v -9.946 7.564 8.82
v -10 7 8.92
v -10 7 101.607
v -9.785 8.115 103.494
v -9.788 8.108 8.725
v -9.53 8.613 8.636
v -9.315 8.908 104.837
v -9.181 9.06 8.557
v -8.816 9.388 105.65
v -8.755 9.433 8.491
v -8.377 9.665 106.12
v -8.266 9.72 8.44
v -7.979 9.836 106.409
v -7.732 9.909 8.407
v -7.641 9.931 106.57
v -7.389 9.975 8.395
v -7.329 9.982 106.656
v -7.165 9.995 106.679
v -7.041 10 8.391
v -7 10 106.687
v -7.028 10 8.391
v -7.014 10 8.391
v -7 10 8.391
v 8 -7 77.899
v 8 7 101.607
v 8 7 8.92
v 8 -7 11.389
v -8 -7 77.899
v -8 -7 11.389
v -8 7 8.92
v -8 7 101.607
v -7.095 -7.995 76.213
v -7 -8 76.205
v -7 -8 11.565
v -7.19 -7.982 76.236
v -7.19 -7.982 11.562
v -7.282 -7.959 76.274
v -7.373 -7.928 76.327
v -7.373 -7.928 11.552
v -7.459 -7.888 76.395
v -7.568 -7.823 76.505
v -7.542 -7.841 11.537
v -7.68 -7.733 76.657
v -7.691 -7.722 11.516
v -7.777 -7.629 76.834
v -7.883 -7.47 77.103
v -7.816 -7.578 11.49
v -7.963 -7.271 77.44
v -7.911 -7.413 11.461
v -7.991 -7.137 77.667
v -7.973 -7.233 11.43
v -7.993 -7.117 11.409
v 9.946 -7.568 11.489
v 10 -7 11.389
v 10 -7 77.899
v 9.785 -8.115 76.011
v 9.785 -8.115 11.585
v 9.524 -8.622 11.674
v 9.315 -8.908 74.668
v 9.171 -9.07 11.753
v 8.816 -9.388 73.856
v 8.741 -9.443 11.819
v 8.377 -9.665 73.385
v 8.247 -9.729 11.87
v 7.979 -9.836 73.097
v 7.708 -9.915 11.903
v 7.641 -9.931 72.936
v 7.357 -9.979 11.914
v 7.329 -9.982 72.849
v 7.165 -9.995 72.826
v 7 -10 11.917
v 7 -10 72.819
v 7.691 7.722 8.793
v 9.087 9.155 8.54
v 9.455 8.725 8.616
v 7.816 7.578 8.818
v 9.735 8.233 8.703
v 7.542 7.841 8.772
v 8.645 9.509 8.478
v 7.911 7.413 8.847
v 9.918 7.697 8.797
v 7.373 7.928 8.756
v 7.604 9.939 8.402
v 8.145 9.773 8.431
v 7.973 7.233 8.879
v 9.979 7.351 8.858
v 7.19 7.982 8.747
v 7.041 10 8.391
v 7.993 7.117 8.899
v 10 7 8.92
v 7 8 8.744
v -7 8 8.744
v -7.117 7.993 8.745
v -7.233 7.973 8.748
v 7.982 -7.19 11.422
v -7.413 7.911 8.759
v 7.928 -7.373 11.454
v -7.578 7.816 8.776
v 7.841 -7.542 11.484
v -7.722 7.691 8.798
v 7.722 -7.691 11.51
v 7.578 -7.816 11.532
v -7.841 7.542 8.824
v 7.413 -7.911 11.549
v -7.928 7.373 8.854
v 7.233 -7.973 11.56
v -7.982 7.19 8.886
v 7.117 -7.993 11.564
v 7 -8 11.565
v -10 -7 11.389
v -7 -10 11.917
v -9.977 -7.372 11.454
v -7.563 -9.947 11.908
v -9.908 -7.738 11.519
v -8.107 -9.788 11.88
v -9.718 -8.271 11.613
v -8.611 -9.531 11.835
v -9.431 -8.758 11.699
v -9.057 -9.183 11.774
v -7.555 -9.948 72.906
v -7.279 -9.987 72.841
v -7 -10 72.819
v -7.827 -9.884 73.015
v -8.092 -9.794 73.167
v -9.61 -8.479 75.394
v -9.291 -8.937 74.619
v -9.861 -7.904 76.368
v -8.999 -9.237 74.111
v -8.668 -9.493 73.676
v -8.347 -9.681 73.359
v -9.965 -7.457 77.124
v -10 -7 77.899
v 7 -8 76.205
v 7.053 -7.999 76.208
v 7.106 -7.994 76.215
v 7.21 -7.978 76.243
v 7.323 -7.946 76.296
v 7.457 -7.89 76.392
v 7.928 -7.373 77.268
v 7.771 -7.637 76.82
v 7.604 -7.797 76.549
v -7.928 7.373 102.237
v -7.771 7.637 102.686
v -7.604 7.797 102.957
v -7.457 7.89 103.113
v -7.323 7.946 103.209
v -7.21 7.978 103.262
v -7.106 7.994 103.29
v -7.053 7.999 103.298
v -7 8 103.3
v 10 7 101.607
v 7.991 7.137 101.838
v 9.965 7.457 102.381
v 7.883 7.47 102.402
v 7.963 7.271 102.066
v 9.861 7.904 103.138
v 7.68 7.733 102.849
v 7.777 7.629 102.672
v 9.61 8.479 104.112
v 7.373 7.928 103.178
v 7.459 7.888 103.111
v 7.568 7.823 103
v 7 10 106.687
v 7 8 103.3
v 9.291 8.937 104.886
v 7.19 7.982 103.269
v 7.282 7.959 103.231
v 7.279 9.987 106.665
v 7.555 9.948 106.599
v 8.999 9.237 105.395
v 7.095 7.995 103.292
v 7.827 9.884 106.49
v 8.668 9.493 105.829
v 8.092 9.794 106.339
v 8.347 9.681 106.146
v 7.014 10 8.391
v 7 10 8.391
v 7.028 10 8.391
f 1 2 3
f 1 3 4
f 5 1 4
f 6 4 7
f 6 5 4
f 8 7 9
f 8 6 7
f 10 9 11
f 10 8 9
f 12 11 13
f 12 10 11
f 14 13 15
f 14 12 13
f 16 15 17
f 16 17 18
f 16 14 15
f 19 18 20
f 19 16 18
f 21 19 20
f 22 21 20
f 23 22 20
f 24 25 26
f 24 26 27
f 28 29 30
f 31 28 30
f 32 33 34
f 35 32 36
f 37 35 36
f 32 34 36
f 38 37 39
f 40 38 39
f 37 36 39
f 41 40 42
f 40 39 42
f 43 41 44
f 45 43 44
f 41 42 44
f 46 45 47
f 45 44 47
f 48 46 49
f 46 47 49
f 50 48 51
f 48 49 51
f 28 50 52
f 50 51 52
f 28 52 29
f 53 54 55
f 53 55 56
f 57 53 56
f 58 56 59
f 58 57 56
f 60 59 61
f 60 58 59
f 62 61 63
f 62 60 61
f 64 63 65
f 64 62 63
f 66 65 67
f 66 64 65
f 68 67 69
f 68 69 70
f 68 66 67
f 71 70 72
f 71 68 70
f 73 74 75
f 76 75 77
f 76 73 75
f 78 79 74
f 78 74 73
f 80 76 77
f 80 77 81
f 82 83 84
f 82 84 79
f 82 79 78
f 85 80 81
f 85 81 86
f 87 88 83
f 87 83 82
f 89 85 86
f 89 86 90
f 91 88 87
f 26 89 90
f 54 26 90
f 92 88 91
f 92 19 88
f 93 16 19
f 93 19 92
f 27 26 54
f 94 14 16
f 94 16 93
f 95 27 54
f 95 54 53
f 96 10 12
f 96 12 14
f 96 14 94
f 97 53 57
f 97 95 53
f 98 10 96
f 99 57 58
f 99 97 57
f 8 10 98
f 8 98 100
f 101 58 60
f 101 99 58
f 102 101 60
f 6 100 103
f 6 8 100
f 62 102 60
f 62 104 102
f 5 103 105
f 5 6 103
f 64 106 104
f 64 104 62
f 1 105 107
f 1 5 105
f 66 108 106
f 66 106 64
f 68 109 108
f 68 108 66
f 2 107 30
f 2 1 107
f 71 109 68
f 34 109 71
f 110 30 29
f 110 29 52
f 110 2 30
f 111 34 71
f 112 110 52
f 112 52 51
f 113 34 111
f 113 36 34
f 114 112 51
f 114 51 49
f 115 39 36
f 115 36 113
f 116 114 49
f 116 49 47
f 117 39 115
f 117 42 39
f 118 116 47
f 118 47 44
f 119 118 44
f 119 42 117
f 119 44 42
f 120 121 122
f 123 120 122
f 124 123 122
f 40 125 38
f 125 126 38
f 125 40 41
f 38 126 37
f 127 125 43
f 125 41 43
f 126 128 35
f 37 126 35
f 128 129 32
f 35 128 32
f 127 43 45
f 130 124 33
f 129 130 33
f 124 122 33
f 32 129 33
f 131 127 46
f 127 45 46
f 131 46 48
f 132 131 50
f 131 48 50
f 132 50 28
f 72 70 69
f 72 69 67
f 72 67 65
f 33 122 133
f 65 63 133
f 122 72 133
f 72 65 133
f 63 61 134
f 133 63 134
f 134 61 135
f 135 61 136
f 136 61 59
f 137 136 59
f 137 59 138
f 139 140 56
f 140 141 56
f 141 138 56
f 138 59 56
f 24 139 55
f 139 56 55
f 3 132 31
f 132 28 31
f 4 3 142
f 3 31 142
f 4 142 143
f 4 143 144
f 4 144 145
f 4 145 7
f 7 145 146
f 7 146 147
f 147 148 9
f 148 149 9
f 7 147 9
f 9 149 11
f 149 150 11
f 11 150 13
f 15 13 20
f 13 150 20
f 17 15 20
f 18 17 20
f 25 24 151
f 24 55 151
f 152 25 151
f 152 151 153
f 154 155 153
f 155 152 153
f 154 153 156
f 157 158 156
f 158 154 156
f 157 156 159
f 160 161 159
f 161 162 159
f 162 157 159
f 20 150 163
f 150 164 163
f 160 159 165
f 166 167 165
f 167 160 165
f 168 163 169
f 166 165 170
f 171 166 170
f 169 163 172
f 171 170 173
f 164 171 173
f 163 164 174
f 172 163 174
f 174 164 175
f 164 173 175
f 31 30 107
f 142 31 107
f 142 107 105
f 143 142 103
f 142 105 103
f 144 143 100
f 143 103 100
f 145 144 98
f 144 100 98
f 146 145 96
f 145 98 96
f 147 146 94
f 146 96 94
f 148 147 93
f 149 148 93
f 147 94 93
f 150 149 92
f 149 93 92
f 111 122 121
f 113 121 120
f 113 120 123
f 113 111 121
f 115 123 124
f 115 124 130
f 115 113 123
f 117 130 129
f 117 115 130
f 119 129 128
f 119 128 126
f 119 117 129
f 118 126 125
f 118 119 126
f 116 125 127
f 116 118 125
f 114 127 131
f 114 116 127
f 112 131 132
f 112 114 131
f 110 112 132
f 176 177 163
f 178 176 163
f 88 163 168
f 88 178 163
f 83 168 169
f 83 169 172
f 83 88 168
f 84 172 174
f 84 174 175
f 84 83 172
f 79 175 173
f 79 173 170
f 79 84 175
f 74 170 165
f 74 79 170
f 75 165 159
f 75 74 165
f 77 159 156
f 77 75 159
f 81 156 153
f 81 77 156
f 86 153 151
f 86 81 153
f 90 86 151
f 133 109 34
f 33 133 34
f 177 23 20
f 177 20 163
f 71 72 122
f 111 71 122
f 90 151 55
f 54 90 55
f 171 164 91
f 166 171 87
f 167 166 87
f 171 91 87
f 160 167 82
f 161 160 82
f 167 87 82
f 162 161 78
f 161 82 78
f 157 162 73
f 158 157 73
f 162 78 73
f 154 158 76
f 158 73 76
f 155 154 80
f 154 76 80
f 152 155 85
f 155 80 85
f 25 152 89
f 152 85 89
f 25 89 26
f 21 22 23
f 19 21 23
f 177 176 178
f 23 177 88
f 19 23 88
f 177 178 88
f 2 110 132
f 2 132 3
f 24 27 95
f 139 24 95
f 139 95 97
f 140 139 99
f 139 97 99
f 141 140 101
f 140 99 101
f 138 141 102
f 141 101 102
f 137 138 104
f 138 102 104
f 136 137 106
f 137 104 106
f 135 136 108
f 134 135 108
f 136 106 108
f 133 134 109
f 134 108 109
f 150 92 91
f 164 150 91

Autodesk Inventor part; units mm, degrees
ref_plane "Start Plane" through (0, 0, 8.391) normal (0, 0, 1) x (1, 0, 0)
ref_plane "End Plane" through (0, 0, 60) normal (0, 0, 1) x (1, 0, 0)
sketch "Sketch" plane through (0, 0, 0) normal (0, 0, 1) x (1, 0, 0)
  line L0 (-10, -7) -> (-10, 7)
  line L1 (-7, 10) -> (7, 10)
  line L2 (10, 7) -> (10, -7)
  line L3 (7, -10) -> (-7, -10)
  arc A0 (-10, -7) -> (-7, -10) centre (-7, -7) ccw
  arc A1 (-7, 10) -> (-10, 7) centre (-7, 7) ccw
  arc A2 (10, 7) -> (7, 10) centre (7, 7) ccw
  arc A3 (7, -10) -> (10, -7) centre (7, -7) ccw
  arc A4 (-7, 8) -> (-8, 7) centre (-7, 7) ccw
  line L4 (-7, 8) -> (7, 8)
  arc A5 (8, 7) -> (7, 8) centre (7, 7) ccw
  line L5 (8, 7) -> (8, -7)
  arc A6 (7, -8) -> (8, -7) centre (7, -7) ccw
  line L6 (7, -8) -> (-7, -8)
  arc A7 (-8, -7) -> (-7, -8) centre (-7, -7) ccw
  line L7 (-8, -7) -> (-8, 7)
  line L8 (0, 14.8698) -> (0, -14.8698) construction
  line L9 (-14.8698, 0) -> (14.8698, 0) construction
  dimension "d7" = 3
  dimension "d10" = 20
  dimension "d11" = 20
  dimension "d12" = 2
  dimension "d15" = 10
  dimension "d16" = 10
extrude "Body" add sketch "Sketch" along normal up to surface (51.609 mm away) from surface at 8.391
sketch "Sketch3" plane through (0, 0, 0) normal (0, 0, 1) x (1, 0, 0)
  line L0 (0, 0) -> (10, 0)
ref_plane "Work Plane3" through (0, 0, 0) normal (0, -1, 0) x (1, 0, 0)
sketch "Sketch4" plane through (0, 0, 0) normal (0, -1, 0) x (1, 0, 0)
  line L0 (-2, 8.391) -> (12, 8.391)
  line L1 (-2, 60) -> (12, 60)
  dimension "d18" = 51.609
sketch "Sketch5" plane through (-7, -10, 60) normal (0, 0, 1) x (1, 0, 0)
  line L0 (14, 18) -> (0, 18) projected
  arc A0 (15, 17) -> (14, 18) centre (14, 17) ccw projected
  line L1 (15, 3) -> (15, 17) projected
  arc A1 (14, 2) -> (15, 3) centre (14, 3) ccw projected
  line L2 (0, 2) -> (14, 2) projected
  arc A2 (-1, 3) -> (0, 2) centre (0, 3) ccw projected
  line L3 (-1, 17) -> (-1, 3) projected
  arc A3 (0, 18) -> (-1, 17) centre (0, 17) ccw projected
  line L4 (-3, 3) -> (-3, 17) projected
  arc A4 (-3, 3) -> (0, 0) centre (0, 3) ccw projected
  line L5 (14, 0) -> (0, 0) projected
  arc A5 (14, 0) -> (17, 3) centre (14, 3) ccw projected
  line L6 (17, 17) -> (17, 3) projected
  arc A6 (17, 17) -> (14, 20) centre (14, 17) ccw projected
  line L7 (0, 20) -> (14, 20) projected
  arc A7 (0, 20) -> (-3, 17) centre (0, 17) ccw projected
  point P0 (7, 10)
ref_plane "Work Plane4" through (-6.5, -25.0184, 42.0413) normal (0, 0.9318, -0.363) x (0, 0.363, 0.9318)
ref_plane "Work Plane5" through (-6.5, -27.0573, 38.5716) normal (0, 0.8829, -0.4695) x (0, 0.4695, 0.8829)
ref_plane "Work Plane7" through (-6.5, -28.4333, 41.6034) normal (0, 0.8611, -0.5085) x (0, 0.5085, 0.8611)
ref_plane "Work Plane8" through (-6.5, -28.4333, 41.6034) normal (0, 0.8611, -0.5085) x (0, 0.5085, 0.8611)
extrude "Extrusion2" add sketch "Sketch5" along normal up to surface surface through (-6.5, -28.4333, 41.6034) normal (0, 0.8611, -0.5085)
ref_plane "Work Plane6" through (75, 8.6301, 8.6325) normal (0, -0.1736, -0.9848) x (1, 0, 0)
split "Split1" plane through (75, 8.6301, 8.6325) removes the side toward (0, -0.1736, -0.9848)
equation "\"d7\" = G_IR"
equation "\"d10\" = G_H"
equation "\"d11\" = G_W"
equation "\"d12\" = G_T"
equation "\"d15\" = 0.5 * d10"
equation "\"d16\" = 0.5 * d11"
equation "\"d3\" = G_L"
equation "\"G_W\" = 20"
equation "\"G_H\" = 20"
equation "\"G_T\" = 2"
equation "\"G_IR\" = 3"
equation "\"G_L\" = 98.29424"
equation "\"G_OFFSET_START\" = -8.391"
equation "\"G_OFFSET_END\" = 0"
equation "\"d13\" = -G_OFFSET_START"
properties part number "ISO 12633-2 - 20x20x2 - 98,29" material "Steel, Mild"
